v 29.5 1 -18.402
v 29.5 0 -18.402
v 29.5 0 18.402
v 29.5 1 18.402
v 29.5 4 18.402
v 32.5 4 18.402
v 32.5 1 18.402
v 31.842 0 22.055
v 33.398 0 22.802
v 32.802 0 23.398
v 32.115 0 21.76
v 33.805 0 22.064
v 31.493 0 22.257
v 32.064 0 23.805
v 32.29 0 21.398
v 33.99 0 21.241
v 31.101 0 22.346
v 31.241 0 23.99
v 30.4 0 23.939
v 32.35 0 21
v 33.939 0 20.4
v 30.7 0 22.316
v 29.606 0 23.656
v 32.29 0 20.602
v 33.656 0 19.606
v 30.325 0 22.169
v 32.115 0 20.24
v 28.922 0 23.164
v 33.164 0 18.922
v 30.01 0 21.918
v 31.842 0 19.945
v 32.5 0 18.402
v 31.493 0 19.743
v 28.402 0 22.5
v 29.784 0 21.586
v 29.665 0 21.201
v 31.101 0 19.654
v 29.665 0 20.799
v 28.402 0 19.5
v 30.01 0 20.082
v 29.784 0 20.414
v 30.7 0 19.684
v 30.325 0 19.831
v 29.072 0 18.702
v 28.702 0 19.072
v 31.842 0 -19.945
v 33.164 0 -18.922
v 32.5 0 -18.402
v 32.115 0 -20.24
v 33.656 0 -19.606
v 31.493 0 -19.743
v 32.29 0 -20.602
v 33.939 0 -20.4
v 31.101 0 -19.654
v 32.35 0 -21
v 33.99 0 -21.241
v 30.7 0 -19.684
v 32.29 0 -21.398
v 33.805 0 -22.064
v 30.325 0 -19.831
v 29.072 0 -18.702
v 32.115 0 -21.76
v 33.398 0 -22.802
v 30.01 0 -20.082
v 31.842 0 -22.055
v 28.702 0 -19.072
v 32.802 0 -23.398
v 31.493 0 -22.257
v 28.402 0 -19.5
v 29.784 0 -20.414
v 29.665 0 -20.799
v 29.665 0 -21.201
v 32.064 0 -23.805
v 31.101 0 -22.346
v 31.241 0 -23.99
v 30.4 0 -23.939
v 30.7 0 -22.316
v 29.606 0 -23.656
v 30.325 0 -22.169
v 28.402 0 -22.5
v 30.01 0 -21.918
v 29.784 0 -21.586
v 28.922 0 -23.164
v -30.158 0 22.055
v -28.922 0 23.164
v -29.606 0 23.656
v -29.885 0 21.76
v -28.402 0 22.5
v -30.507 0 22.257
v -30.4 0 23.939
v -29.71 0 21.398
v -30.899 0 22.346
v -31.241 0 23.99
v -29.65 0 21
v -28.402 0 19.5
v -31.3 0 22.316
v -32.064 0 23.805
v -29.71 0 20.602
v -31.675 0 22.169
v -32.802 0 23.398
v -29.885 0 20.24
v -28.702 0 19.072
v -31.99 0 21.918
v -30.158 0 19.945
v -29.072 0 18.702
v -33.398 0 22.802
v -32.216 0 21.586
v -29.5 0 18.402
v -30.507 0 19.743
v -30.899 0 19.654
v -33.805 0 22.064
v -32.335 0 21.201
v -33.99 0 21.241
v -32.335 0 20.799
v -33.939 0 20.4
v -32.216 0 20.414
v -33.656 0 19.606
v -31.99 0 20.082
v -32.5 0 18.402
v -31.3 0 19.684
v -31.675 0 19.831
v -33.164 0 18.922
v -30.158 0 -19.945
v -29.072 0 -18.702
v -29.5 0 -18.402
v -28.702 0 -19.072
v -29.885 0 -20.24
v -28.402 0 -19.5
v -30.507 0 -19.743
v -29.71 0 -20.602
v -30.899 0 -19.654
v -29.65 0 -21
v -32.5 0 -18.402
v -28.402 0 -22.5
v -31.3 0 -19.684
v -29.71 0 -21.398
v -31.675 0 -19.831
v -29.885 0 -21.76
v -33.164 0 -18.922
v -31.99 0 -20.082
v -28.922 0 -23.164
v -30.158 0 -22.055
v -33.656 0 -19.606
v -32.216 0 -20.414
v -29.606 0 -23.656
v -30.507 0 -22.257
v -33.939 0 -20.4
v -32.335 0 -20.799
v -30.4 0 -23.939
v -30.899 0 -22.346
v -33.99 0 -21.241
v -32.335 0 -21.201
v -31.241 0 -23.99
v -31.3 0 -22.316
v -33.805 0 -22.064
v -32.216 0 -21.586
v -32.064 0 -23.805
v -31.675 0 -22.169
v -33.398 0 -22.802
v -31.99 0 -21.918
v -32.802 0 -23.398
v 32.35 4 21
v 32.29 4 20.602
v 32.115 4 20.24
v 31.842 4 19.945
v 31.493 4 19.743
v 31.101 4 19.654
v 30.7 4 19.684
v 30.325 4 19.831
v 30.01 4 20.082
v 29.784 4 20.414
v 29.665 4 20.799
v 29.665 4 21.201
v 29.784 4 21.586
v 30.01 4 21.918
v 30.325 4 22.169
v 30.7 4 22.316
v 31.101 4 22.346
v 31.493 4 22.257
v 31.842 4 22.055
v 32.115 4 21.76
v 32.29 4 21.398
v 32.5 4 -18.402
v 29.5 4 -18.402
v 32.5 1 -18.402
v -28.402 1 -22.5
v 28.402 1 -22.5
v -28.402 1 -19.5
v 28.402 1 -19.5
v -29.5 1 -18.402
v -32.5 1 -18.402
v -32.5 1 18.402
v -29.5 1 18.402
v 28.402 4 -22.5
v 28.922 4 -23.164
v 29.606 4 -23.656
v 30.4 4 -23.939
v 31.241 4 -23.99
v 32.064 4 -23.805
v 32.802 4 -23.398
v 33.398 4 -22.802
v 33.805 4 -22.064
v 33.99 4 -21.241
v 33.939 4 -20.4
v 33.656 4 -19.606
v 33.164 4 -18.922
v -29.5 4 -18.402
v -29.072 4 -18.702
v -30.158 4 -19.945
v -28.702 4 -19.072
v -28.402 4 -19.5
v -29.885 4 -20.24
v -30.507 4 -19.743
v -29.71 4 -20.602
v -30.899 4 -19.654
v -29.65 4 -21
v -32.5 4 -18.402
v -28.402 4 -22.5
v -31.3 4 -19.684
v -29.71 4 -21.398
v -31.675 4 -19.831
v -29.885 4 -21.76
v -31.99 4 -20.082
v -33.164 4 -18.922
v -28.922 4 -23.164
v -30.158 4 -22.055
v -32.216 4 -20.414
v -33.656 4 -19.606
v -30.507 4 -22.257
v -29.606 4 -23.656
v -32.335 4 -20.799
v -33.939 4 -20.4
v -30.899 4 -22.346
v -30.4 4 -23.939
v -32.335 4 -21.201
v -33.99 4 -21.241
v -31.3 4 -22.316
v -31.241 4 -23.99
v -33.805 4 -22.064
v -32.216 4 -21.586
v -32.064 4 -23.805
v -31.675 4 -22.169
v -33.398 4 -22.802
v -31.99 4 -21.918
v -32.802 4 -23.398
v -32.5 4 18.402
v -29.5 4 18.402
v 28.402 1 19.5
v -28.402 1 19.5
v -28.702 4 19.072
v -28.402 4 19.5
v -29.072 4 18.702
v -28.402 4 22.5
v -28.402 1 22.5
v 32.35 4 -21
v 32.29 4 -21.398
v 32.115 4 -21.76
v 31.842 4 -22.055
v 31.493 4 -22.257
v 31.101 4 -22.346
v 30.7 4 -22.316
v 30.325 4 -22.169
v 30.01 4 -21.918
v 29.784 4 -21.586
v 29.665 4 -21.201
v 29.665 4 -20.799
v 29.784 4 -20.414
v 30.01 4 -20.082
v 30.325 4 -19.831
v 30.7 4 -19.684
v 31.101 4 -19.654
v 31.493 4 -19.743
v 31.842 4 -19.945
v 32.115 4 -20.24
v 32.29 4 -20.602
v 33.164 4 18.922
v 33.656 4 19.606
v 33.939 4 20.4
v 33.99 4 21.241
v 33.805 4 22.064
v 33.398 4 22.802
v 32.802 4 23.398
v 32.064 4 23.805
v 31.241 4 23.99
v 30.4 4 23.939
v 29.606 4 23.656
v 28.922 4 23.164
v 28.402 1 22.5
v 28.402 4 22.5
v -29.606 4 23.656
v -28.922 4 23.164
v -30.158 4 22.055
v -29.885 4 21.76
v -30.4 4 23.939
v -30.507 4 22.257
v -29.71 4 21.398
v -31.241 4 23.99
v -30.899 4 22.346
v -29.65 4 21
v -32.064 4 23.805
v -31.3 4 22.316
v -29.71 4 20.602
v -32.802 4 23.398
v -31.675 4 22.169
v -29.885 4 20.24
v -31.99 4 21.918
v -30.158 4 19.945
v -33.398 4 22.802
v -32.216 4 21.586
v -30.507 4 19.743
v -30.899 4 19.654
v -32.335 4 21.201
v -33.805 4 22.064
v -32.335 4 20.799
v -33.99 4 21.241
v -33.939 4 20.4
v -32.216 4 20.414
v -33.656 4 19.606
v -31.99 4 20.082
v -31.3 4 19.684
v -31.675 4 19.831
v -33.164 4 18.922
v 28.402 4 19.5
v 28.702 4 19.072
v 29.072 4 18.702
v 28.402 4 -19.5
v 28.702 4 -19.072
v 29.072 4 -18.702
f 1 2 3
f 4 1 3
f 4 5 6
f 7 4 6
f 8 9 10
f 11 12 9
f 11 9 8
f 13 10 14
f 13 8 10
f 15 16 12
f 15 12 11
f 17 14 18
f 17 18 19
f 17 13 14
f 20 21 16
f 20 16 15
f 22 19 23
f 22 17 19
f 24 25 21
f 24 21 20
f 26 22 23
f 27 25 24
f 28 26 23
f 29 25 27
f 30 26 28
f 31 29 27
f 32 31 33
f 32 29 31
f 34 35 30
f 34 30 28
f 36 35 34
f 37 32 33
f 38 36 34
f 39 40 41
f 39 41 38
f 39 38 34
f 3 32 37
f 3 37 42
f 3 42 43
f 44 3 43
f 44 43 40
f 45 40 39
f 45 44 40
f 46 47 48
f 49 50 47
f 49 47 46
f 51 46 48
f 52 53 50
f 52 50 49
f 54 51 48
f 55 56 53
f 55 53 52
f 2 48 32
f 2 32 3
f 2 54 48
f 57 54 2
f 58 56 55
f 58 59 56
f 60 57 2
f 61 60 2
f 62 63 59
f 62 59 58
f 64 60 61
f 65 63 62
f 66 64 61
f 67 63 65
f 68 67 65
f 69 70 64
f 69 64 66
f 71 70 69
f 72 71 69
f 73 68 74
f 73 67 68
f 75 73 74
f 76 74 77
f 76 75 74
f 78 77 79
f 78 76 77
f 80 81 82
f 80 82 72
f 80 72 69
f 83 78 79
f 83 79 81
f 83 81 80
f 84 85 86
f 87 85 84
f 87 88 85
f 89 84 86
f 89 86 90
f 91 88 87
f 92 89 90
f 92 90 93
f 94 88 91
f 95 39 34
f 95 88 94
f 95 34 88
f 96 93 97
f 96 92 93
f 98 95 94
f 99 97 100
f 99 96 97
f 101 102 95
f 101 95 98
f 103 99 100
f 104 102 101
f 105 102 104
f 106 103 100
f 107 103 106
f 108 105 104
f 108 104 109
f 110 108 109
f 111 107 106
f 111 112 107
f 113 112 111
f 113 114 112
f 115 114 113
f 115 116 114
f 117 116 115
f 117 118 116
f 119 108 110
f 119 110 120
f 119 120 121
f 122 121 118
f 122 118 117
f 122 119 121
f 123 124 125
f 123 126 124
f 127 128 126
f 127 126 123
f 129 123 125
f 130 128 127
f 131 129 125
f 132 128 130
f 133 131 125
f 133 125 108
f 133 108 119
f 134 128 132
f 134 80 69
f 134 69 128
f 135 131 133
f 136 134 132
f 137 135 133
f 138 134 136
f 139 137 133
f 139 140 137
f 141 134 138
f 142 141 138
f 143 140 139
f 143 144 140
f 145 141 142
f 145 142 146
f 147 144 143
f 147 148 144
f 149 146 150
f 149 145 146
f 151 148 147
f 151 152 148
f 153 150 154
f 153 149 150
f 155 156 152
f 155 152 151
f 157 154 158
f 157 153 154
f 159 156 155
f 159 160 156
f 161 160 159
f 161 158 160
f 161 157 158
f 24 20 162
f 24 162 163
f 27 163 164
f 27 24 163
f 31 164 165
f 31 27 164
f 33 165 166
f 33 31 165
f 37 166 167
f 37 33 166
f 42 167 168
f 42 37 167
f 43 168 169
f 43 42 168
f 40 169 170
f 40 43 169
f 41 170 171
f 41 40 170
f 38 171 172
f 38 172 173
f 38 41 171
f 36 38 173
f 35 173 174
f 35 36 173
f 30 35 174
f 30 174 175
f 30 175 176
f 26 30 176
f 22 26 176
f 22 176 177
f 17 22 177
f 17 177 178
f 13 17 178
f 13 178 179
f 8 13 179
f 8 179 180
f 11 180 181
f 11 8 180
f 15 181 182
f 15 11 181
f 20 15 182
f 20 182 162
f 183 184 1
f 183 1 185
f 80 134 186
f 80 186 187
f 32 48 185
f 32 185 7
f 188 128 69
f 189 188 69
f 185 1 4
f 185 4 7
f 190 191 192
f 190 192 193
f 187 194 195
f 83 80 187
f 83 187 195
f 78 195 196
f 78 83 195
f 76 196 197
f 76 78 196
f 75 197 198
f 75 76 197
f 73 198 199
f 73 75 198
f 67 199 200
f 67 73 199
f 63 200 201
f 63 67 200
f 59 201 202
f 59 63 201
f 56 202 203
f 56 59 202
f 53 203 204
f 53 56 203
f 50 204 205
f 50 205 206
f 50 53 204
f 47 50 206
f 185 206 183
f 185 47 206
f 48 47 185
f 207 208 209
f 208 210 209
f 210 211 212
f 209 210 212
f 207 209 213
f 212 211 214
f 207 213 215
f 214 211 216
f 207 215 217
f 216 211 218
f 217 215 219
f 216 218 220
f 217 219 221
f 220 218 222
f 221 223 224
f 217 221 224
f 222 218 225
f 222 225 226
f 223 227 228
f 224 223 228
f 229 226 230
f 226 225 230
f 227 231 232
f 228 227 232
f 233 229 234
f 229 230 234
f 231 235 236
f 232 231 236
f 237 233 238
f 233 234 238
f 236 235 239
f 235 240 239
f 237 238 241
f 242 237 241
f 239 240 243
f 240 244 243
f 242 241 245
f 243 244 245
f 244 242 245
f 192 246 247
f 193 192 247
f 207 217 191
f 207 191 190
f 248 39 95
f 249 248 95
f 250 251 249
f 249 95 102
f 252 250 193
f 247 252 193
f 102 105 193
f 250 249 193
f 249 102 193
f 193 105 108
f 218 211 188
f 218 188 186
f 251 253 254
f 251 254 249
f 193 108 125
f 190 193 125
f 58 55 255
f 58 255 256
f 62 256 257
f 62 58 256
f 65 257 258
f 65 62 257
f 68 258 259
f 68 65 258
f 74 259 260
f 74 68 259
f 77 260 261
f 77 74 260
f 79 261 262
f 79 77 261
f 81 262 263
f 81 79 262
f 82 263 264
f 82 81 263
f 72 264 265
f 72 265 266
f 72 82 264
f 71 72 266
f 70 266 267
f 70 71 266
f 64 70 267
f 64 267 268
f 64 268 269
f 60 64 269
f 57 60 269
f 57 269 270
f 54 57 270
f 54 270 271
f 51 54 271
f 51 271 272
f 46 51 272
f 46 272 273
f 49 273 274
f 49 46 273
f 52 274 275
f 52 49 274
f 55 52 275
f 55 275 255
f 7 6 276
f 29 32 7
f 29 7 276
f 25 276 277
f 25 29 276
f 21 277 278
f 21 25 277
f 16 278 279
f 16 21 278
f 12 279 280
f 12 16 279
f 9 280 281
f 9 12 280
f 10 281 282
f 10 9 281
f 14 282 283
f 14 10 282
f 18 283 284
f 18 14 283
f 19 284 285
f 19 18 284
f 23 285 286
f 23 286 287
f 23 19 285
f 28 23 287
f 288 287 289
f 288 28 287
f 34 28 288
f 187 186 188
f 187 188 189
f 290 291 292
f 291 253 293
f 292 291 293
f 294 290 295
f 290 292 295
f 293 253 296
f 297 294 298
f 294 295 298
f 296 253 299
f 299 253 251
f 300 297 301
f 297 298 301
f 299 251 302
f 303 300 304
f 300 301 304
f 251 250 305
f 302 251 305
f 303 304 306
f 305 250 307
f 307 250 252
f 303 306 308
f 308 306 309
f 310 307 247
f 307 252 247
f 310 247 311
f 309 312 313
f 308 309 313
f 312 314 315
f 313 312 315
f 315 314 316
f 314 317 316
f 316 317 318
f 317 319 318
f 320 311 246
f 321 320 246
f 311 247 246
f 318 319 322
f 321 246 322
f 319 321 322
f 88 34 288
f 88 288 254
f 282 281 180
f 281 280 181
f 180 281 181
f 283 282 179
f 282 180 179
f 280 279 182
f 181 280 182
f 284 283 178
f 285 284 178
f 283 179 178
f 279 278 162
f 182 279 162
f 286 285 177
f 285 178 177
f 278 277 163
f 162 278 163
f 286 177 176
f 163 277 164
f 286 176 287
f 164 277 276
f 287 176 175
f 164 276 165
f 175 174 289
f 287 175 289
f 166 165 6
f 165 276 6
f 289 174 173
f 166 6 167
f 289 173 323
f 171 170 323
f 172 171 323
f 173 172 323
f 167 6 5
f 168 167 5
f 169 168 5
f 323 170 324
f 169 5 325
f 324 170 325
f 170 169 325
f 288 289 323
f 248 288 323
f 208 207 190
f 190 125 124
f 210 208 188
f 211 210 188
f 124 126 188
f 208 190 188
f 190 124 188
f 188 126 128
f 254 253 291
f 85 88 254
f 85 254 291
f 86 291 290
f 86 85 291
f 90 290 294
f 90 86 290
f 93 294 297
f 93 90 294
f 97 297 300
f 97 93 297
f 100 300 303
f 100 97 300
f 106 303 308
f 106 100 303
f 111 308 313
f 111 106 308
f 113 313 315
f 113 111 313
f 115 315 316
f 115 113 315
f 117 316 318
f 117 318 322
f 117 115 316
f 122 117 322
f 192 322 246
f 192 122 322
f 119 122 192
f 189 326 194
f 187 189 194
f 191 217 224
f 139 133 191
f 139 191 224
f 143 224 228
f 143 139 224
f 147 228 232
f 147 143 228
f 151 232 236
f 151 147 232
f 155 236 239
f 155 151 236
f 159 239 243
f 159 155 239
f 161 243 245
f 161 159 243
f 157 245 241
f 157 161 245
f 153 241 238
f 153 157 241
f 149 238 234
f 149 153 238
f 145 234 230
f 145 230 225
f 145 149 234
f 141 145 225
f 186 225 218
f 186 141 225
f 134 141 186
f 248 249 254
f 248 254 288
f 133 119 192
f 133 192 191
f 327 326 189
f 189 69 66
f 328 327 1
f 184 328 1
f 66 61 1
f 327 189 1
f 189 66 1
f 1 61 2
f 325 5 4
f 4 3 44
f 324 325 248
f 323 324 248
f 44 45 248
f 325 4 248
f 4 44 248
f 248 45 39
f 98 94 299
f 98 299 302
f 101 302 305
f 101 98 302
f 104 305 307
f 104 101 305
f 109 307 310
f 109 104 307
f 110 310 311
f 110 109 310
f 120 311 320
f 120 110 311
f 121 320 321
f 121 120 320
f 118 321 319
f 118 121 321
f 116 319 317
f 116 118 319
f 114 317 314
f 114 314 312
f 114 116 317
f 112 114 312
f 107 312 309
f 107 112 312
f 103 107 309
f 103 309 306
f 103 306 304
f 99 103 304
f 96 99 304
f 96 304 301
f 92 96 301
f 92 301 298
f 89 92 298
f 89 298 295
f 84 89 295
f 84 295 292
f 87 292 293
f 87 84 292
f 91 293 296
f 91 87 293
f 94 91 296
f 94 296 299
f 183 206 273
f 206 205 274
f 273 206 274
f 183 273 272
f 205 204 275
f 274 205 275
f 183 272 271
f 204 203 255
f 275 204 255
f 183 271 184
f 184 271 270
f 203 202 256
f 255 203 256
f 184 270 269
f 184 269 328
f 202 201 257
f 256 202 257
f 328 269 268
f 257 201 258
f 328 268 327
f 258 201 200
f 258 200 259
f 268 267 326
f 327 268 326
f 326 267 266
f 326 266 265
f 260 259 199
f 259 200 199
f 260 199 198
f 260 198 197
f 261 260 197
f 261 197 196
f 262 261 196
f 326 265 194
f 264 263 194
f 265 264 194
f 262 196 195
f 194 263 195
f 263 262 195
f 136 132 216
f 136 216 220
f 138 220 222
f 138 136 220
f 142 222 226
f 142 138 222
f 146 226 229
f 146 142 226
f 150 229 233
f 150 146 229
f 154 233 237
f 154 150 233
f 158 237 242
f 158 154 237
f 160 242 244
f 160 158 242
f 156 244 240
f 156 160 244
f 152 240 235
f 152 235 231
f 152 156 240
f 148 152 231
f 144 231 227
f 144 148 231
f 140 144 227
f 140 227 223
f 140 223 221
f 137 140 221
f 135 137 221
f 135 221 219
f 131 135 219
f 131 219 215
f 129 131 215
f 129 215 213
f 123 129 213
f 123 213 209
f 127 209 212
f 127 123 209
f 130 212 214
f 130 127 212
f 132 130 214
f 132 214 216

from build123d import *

# Parameters (mm, degrees)
SKETCH1_R           = 1.35
BOSS_EXTRUDE1_DEPTH = 4
SKETCH2_W           = 3
SKETCH2_H           = 36.803847578
SKETCH2_W_2         = 56.803847578
SKETCH2_H_2         = 3
CUT_EXTRUDE1_DEPTH  = 3


with BuildPart() as part:
    # Sketch1 → Boss-Extrude1 (new body)
    with BuildSketch(Plane(origin=(0, 0, 0), x_dir=(1, 0, 0), z_dir=(0, 1, 0))):
        with BuildLine():
            Line((-28.401923789, 22.5), (28.401923789, 22.5))
            ThreePointArc((28.401923789, 22.5), (33.121320344, 23.121320344), (32.5, 18.401923789))
            Line((32.5, 18.401923789), (32.5, -18.401923789))
            ThreePointArc((32.5, -18.401923789), (33.121320344, -23.121320344), (28.401923789, -22.5))
            Line((28.401923789, -22.5), (-28.401923789, -22.5))
            ThreePointArc((-28.401923789, -22.5), (-33.121320344, -23.121320344), (-32.5, -18.401923789))
            Line((-32.5, -18.401923789), (-32.5, 18.401923789))
            ThreePointArc((-32.5, 18.401923789), (-33.121320344, 23.121320344), (-28.401923789, 22.5))
        make_face()
        with Locations((31, 21)):
            Circle(SKETCH1_R, mode=Mode.SUBTRACT)
        with Locations((31, -21)):
            Circle(SKETCH1_R, mode=Mode.SUBTRACT)
        with Locations((-31, -21)):
            Circle(SKETCH1_R, mode=Mode.SUBTRACT)
        with Locations((-31, 21)):
            Circle(SKETCH1_R, mode=Mode.SUBTRACT)
        with BuildLine():
            Line((-28.401923789, 19.5), (28.401923789, 19.5))
            ThreePointArc((28.401923789, 19.5), (28.878679656, 18.878679656), (29.5, 18.401923789))
            Line((29.5, 18.401923789), (29.5, -18.401923789))
            ThreePointArc((29.5, -18.401923789), (28.878679656, -18.878679656), (28.401923789, -19.5))
            Line((28.401923789, -19.5), (-28.401923789, -19.5))
            ThreePointArc((-28.401923789, -19.5), (-28.878679656, -18.878679656), (-29.5, -18.401923789))
            Line((-29.5, -18.401923789), (-29.5, 18.401923789))
            ThreePointArc((-29.5, 18.401923789), (-28.878679656, 18.878679656), (-28.401923789, 19.5))
        make_face(mode=Mode.SUBTRACT)
    extrude(amount=BOSS_EXTRUDE1_DEPTH)

    # Sketch2 → Cut-Extrude1 (cut)
    with BuildSketch(Plane(origin=(0, 4, 0), x_dir=(1, 0, 0), z_dir=(0, 1, 0))):
        with Locations((-31, 0)):
            Rectangle(SKETCH2_W, SKETCH2_H)
        with Locations((0, -21)):
            Rectangle(SKETCH2_W_2, SKETCH2_H_2)
        with Locations((31, 0)):
            Rectangle(SKETCH2_W, SKETCH2_H)
        with Locations((0, 21)):
            Rectangle(SKETCH2_W_2, SKETCH2_H_2)
    extrude(amount=-CUT_EXTRUDE1_DEPTH, mode=Mode.SUBTRACT)


solid = part.part
